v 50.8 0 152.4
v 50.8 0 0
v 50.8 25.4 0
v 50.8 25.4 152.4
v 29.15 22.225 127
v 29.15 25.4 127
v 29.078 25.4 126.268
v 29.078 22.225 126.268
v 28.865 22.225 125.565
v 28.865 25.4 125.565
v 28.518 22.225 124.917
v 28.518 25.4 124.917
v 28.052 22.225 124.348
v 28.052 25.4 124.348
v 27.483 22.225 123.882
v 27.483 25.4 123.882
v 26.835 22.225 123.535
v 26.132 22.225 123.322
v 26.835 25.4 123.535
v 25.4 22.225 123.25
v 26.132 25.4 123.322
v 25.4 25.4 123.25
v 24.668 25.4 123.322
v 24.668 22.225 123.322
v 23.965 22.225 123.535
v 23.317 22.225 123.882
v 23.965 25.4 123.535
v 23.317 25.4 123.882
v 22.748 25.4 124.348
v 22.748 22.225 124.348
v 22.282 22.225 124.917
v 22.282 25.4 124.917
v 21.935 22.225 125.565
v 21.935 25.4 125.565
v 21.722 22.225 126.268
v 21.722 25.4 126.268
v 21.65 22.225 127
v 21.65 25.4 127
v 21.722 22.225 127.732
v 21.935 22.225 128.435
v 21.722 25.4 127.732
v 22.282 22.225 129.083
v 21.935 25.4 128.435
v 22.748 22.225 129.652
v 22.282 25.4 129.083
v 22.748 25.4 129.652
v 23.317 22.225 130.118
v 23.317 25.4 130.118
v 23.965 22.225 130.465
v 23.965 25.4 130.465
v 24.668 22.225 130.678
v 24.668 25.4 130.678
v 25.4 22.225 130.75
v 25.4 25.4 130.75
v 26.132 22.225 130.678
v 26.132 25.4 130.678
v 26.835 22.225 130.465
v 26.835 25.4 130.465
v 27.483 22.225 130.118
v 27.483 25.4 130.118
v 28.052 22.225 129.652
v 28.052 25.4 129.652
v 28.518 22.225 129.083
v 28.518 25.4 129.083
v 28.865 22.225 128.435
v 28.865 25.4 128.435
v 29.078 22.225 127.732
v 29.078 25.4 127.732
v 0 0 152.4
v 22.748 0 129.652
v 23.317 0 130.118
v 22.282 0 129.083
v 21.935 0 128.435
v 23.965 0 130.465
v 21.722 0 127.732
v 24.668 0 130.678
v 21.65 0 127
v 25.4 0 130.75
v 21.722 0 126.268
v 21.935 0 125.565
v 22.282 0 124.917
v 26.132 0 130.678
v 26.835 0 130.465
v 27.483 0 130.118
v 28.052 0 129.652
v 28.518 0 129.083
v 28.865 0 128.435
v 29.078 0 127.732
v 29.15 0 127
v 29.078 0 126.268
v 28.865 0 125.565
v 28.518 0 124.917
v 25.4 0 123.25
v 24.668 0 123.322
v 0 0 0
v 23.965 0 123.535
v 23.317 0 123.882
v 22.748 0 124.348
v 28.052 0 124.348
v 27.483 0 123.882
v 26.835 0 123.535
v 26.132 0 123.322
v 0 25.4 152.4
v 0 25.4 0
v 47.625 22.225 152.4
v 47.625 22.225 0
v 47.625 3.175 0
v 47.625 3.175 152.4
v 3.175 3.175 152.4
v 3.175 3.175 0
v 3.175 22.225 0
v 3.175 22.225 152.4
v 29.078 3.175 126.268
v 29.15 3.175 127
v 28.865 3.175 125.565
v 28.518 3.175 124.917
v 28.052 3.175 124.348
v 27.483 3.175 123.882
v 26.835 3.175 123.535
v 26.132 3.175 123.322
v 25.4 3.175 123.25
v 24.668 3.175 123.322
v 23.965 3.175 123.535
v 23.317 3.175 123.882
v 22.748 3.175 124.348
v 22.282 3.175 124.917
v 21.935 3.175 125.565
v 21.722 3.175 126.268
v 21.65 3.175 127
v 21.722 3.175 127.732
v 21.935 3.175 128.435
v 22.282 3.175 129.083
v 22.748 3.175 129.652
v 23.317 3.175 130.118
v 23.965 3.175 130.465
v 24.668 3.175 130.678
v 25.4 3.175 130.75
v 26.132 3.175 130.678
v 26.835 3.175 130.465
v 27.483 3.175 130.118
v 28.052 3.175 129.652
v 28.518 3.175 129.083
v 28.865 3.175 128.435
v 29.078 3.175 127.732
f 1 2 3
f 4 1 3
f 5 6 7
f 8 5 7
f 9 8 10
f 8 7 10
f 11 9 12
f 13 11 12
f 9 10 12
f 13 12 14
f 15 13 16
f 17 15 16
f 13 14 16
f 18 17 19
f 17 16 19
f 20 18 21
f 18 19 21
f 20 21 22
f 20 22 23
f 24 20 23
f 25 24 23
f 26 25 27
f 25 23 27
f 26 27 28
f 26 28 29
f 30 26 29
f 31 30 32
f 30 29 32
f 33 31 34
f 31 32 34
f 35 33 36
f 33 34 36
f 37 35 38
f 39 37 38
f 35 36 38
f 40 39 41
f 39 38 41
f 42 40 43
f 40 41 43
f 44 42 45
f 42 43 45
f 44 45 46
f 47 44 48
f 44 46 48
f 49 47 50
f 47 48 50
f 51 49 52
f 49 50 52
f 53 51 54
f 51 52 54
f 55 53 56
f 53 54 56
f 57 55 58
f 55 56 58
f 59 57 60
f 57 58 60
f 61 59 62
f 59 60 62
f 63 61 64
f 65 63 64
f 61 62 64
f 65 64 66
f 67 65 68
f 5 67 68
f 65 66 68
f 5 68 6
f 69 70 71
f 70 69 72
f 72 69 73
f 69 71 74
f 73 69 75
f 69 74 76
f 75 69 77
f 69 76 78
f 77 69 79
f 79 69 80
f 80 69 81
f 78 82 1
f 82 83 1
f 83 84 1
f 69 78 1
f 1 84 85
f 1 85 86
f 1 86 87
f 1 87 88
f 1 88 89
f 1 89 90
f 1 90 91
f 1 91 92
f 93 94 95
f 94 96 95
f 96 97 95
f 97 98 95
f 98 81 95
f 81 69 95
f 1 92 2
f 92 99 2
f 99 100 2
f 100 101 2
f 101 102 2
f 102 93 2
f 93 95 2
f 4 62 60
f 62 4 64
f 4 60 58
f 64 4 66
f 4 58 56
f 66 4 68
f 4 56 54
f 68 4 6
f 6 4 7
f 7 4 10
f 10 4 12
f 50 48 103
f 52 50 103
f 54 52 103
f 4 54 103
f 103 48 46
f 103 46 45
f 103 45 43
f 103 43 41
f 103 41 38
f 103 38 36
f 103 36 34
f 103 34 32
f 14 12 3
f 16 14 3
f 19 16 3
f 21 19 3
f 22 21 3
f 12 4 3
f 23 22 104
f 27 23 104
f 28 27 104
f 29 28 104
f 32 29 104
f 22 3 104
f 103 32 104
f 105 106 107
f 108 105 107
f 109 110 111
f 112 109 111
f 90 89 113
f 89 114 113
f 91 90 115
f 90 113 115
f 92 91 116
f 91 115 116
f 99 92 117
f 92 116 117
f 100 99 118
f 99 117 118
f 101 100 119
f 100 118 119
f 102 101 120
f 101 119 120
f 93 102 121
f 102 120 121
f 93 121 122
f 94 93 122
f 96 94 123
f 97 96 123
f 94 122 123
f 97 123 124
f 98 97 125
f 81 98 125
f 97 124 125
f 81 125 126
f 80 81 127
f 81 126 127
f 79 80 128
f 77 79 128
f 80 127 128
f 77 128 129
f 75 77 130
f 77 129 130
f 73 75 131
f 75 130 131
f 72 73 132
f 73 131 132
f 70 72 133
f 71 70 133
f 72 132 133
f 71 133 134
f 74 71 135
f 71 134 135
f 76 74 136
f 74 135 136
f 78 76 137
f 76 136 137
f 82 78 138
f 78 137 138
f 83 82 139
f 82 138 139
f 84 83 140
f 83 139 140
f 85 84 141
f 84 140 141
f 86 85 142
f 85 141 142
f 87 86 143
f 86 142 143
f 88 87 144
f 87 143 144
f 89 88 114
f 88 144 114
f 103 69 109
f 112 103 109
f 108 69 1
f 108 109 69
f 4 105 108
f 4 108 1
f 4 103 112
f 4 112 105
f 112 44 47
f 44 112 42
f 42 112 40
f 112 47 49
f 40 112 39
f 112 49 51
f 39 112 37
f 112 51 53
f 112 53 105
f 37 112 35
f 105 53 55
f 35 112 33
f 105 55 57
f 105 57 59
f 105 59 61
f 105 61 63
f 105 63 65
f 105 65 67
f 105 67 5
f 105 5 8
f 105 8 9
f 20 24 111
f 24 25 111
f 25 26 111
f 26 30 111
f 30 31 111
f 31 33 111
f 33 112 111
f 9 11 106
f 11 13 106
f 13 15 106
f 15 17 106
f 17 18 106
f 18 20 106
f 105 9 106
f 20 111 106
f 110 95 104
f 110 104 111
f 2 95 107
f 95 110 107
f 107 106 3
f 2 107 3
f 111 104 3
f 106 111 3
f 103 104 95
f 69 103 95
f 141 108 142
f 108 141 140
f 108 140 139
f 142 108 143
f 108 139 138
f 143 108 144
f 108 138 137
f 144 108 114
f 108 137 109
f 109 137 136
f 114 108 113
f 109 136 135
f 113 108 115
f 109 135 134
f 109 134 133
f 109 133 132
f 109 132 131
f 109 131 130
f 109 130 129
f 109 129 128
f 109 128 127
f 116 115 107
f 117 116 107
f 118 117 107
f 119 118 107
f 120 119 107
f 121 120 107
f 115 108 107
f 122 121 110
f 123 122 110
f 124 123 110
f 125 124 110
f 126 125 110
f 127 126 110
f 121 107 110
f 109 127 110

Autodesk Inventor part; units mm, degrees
ref_plane "YZ Plane" through (0, 0, 0) normal (1, 0, 0) x (0, 1, 0)
ref_plane "XZ Plane" through (0, 0, 0) normal (0, 1, 0) x (-1, 0, 0)
sketch "Sketch1" plane through (0, 0, 0) normal (0, 0, 1) x (1, 0, 0)
  line L0 (0, 0) -> (50.8, 0)
  line L1 (50.8, 0) -> (50.8, 25.4)
  line L2 (50.8, 25.4) -> (0, 25.4)
  line L3 (0, 25.4) -> (0, 0)
  line L4 (3.175, 22.225) -> (47.625, 22.225)
  line L5 (47.625, 22.225) -> (47.625, 3.175)
  line L6 (47.625, 3.175) -> (3.175, 3.175)
  line L7 (3.175, 3.175) -> (3.175, 22.225)
  dimension "d0" = 50.8
  dimension "d1" = 25.4
  dimension "d2" = 3.175
extrude "Extrusion1" add sketch "Sketch1" along normal blind 152.4
sketch "Sketch2" plane through (0, 25.4, 0) normal (0, 1, 0) x (1, 0, 0)
  line L0 (0, -152.4) -> (50.8, -152.4) projected
  line L1 (0, 0) -> (0, -152.4) projected
  circle A0 centre (25.4, -127) radius 3.75
  dimension "d5" = 7.5
  dimension "d6" = 25.4
  dimension "d7" = 25.4
extrude "Extrusion2" cut sketch "Sketch2" against normal blind 76.2
ref_plane "Work Plane1" through (0, 12.7, 0) normal (0, -1, 0) x (1, 0, 0)
properties part number "Spinner brace" material "Aluminum 6061"
